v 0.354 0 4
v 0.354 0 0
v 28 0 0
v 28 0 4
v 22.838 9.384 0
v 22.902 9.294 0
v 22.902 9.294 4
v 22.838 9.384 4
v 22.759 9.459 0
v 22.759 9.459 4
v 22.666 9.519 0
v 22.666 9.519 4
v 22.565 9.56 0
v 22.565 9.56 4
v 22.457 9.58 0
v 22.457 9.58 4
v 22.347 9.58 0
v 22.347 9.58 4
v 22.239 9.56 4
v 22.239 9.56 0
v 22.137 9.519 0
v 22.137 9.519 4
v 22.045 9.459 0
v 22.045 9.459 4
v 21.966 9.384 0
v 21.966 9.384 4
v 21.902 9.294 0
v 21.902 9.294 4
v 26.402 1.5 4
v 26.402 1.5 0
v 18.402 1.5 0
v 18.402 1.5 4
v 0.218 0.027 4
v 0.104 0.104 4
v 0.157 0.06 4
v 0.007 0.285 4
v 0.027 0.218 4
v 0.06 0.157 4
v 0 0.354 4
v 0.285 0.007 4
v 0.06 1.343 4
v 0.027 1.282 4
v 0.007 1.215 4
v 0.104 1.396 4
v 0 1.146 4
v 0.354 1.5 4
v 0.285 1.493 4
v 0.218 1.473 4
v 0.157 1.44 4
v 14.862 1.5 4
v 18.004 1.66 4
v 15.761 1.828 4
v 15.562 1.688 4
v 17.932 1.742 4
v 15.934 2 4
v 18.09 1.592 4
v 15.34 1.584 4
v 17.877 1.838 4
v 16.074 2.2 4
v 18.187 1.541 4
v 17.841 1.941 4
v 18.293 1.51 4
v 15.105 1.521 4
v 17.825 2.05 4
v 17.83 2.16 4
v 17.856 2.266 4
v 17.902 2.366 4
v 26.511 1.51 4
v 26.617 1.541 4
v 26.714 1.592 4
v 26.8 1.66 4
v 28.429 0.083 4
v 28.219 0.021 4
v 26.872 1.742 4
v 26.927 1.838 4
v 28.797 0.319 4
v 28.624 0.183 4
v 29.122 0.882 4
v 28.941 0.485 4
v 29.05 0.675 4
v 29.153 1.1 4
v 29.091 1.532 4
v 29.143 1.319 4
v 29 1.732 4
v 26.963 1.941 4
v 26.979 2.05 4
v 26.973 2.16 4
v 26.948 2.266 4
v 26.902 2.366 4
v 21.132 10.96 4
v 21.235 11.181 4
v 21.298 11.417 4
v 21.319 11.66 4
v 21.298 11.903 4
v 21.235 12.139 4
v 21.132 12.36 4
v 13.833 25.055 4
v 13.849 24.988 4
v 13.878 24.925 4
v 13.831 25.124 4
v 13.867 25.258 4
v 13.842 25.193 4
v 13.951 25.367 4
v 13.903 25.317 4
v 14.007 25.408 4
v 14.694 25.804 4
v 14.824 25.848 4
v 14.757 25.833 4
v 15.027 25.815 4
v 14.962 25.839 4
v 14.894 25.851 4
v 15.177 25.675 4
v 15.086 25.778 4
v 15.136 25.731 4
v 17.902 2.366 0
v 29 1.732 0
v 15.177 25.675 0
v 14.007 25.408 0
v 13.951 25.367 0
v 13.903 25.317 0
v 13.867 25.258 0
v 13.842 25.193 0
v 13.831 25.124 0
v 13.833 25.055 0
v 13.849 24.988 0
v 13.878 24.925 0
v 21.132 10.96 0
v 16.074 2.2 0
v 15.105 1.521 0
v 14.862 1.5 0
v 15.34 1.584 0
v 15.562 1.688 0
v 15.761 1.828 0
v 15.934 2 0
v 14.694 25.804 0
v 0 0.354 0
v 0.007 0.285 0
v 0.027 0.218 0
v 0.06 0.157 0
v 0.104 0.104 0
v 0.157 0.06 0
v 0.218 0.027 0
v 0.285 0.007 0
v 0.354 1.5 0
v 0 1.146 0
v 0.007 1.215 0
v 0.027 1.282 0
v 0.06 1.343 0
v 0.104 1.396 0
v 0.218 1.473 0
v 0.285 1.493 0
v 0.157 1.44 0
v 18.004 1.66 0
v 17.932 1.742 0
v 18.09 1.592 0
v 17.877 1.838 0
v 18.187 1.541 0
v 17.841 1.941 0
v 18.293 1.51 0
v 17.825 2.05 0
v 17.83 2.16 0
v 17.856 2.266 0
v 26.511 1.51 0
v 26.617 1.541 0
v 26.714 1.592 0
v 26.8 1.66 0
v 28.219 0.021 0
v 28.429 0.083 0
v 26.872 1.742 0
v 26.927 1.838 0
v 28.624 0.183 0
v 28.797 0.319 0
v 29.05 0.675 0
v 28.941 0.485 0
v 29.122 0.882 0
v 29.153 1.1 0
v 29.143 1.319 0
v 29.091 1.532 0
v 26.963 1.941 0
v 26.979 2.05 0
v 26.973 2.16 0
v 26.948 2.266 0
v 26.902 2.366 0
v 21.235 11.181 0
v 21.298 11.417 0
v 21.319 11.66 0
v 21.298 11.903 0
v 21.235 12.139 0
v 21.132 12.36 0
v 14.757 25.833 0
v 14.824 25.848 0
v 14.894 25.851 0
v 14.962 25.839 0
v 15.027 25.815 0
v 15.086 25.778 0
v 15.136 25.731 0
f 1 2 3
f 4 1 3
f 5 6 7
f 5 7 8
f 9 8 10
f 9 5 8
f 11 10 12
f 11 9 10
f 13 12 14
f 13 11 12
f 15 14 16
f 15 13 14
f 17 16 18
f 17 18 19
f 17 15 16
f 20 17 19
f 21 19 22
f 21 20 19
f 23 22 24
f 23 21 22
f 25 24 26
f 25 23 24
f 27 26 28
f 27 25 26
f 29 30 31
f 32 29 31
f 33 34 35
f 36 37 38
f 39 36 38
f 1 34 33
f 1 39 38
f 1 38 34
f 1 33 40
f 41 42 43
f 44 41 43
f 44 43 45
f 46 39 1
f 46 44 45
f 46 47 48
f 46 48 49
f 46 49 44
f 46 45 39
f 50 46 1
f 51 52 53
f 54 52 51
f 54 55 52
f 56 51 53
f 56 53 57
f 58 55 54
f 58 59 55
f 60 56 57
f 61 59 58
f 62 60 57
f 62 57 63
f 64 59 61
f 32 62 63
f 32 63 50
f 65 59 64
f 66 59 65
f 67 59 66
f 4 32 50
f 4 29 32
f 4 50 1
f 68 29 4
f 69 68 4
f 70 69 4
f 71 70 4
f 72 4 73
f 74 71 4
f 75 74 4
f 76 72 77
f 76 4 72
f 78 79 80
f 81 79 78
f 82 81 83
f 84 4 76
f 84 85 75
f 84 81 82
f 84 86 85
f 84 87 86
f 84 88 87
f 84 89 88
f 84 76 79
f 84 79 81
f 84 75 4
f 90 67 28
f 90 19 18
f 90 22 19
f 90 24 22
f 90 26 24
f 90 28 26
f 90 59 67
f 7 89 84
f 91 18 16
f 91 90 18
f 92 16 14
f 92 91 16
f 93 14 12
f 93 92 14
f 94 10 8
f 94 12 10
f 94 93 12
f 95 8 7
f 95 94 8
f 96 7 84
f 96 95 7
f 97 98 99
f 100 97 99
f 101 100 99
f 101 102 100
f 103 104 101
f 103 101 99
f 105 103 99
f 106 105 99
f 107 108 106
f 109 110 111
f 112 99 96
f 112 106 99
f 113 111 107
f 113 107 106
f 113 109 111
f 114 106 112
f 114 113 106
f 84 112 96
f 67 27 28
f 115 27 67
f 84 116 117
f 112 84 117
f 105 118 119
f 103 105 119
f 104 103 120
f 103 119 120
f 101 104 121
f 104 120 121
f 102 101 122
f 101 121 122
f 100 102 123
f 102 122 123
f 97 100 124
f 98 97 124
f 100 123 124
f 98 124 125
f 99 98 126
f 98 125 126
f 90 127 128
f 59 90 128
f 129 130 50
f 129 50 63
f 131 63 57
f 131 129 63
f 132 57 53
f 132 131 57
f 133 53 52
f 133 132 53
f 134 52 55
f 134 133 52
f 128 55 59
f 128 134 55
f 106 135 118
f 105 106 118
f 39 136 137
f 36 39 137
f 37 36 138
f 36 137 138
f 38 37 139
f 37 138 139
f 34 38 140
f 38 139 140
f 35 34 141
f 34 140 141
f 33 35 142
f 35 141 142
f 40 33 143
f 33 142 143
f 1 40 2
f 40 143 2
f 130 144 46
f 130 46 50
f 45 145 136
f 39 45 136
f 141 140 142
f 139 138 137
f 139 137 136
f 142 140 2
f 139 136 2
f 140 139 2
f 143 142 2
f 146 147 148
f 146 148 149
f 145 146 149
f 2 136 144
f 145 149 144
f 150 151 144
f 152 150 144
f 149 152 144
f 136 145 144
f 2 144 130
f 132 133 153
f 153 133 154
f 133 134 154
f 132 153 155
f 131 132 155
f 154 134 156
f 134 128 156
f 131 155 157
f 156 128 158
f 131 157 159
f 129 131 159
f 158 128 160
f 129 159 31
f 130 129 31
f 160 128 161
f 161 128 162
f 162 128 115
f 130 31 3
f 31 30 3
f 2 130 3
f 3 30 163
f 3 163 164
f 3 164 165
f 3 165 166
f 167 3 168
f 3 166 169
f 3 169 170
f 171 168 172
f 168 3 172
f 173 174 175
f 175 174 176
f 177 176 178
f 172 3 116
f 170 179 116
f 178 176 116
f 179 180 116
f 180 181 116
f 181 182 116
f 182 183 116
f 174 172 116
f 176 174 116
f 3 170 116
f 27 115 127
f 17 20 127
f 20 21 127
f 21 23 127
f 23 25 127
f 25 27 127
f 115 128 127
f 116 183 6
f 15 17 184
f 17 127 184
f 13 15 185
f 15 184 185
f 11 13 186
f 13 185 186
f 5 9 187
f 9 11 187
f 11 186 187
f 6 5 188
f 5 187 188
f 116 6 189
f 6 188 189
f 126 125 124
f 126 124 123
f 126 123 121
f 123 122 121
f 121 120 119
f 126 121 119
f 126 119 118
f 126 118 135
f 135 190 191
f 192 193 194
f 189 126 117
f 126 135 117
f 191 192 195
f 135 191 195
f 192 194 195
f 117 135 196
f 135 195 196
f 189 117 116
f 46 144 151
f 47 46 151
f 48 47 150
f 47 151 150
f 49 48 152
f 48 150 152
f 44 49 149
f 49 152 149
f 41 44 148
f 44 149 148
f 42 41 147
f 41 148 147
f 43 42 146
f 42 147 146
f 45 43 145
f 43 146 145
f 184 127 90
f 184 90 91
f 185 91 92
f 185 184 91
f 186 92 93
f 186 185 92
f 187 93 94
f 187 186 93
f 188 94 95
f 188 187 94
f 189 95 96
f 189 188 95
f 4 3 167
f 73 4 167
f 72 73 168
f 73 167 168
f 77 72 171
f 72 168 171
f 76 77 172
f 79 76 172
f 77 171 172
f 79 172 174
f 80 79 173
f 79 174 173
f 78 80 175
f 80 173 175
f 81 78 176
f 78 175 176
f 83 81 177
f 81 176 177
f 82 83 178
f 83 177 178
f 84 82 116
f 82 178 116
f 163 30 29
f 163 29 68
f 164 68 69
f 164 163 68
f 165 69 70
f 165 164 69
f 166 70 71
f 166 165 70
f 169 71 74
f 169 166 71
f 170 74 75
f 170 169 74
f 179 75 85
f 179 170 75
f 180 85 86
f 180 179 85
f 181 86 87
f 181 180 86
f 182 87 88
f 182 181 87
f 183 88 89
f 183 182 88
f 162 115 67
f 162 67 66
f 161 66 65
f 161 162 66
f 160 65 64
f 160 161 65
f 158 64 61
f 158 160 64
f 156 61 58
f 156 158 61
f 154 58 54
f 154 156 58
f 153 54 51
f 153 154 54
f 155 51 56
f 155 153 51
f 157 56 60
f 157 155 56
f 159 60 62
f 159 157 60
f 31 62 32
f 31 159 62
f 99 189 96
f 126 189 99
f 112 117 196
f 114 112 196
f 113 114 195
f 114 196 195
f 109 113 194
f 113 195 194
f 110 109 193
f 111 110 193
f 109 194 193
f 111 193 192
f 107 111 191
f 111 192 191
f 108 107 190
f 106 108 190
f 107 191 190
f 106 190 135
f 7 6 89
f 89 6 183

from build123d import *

# Parameters (mm, degrees)
PAD_DEPTH = 4


with BuildPart() as part:
    # Sketch → Pad (new body)
    with BuildSketch(Plane.XY):
        with BuildLine():
            Line((0.353553, 0), (28, 0))
            ThreePointArc((28, 0), (29, 0.57735), (29, 1.732051))
            Line((29, 1.732051), (15.176777, 25.674576))
            ThreePointArc((15.176777, 25.674576), (14.962097, 25.839306), (14.693814, 25.803985))
            Line((14.693814, 25.803985), (14.007148, 25.407539))
            ThreePointArc((14.007148, 25.407539), (13.842418, 25.192859), (13.877739, 24.924576))
            Line((21.131753, 12.360254), (13.877739, 24.924576))
            ThreePointArc((21.131753, 10.960254), (21.319318, 11.660254), (21.131753, 12.360254))
            Line((21.131753, 10.960254), (16.074018, 2.2))
            ThreePointArc((14.861583, 1.5), (15.561583, 1.687564), (16.074018, 2.2))
            Line((0.353553, 1.5), (14.861583, 1.5))
            ThreePointArc((0.353553, 1.5), (0.103553, 1.396447), (0, 1.146447))
            Line((0, 1.146447), (0, 0.353553))
            ThreePointArc((0, 0.353553), (0.103553, 0.103553), (0.353553, 0))
        make_face()
        with BuildLine():
            Line((21.901924, 9.294229), (17.901924, 2.366025))
            ThreePointArc((17.901924, 2.366025), (17.901924, 1.788675), (18.401924, 1.5))
            Line((26.401924, 1.5), (18.401924, 1.5))
            ThreePointArc((26.401924, 1.5), (26.901924, 1.788675), (26.901924, 2.366025))
            Line((22.901924, 9.294229), (26.901924, 2.366025))
            ThreePointArc((22.901924, 9.294229), (22.401924, 9.582904), (21.901924, 9.294229))
        make_face(mode=Mode.SUBTRACT)
    extrude(amount=PAD_DEPTH)


solid = part.part
